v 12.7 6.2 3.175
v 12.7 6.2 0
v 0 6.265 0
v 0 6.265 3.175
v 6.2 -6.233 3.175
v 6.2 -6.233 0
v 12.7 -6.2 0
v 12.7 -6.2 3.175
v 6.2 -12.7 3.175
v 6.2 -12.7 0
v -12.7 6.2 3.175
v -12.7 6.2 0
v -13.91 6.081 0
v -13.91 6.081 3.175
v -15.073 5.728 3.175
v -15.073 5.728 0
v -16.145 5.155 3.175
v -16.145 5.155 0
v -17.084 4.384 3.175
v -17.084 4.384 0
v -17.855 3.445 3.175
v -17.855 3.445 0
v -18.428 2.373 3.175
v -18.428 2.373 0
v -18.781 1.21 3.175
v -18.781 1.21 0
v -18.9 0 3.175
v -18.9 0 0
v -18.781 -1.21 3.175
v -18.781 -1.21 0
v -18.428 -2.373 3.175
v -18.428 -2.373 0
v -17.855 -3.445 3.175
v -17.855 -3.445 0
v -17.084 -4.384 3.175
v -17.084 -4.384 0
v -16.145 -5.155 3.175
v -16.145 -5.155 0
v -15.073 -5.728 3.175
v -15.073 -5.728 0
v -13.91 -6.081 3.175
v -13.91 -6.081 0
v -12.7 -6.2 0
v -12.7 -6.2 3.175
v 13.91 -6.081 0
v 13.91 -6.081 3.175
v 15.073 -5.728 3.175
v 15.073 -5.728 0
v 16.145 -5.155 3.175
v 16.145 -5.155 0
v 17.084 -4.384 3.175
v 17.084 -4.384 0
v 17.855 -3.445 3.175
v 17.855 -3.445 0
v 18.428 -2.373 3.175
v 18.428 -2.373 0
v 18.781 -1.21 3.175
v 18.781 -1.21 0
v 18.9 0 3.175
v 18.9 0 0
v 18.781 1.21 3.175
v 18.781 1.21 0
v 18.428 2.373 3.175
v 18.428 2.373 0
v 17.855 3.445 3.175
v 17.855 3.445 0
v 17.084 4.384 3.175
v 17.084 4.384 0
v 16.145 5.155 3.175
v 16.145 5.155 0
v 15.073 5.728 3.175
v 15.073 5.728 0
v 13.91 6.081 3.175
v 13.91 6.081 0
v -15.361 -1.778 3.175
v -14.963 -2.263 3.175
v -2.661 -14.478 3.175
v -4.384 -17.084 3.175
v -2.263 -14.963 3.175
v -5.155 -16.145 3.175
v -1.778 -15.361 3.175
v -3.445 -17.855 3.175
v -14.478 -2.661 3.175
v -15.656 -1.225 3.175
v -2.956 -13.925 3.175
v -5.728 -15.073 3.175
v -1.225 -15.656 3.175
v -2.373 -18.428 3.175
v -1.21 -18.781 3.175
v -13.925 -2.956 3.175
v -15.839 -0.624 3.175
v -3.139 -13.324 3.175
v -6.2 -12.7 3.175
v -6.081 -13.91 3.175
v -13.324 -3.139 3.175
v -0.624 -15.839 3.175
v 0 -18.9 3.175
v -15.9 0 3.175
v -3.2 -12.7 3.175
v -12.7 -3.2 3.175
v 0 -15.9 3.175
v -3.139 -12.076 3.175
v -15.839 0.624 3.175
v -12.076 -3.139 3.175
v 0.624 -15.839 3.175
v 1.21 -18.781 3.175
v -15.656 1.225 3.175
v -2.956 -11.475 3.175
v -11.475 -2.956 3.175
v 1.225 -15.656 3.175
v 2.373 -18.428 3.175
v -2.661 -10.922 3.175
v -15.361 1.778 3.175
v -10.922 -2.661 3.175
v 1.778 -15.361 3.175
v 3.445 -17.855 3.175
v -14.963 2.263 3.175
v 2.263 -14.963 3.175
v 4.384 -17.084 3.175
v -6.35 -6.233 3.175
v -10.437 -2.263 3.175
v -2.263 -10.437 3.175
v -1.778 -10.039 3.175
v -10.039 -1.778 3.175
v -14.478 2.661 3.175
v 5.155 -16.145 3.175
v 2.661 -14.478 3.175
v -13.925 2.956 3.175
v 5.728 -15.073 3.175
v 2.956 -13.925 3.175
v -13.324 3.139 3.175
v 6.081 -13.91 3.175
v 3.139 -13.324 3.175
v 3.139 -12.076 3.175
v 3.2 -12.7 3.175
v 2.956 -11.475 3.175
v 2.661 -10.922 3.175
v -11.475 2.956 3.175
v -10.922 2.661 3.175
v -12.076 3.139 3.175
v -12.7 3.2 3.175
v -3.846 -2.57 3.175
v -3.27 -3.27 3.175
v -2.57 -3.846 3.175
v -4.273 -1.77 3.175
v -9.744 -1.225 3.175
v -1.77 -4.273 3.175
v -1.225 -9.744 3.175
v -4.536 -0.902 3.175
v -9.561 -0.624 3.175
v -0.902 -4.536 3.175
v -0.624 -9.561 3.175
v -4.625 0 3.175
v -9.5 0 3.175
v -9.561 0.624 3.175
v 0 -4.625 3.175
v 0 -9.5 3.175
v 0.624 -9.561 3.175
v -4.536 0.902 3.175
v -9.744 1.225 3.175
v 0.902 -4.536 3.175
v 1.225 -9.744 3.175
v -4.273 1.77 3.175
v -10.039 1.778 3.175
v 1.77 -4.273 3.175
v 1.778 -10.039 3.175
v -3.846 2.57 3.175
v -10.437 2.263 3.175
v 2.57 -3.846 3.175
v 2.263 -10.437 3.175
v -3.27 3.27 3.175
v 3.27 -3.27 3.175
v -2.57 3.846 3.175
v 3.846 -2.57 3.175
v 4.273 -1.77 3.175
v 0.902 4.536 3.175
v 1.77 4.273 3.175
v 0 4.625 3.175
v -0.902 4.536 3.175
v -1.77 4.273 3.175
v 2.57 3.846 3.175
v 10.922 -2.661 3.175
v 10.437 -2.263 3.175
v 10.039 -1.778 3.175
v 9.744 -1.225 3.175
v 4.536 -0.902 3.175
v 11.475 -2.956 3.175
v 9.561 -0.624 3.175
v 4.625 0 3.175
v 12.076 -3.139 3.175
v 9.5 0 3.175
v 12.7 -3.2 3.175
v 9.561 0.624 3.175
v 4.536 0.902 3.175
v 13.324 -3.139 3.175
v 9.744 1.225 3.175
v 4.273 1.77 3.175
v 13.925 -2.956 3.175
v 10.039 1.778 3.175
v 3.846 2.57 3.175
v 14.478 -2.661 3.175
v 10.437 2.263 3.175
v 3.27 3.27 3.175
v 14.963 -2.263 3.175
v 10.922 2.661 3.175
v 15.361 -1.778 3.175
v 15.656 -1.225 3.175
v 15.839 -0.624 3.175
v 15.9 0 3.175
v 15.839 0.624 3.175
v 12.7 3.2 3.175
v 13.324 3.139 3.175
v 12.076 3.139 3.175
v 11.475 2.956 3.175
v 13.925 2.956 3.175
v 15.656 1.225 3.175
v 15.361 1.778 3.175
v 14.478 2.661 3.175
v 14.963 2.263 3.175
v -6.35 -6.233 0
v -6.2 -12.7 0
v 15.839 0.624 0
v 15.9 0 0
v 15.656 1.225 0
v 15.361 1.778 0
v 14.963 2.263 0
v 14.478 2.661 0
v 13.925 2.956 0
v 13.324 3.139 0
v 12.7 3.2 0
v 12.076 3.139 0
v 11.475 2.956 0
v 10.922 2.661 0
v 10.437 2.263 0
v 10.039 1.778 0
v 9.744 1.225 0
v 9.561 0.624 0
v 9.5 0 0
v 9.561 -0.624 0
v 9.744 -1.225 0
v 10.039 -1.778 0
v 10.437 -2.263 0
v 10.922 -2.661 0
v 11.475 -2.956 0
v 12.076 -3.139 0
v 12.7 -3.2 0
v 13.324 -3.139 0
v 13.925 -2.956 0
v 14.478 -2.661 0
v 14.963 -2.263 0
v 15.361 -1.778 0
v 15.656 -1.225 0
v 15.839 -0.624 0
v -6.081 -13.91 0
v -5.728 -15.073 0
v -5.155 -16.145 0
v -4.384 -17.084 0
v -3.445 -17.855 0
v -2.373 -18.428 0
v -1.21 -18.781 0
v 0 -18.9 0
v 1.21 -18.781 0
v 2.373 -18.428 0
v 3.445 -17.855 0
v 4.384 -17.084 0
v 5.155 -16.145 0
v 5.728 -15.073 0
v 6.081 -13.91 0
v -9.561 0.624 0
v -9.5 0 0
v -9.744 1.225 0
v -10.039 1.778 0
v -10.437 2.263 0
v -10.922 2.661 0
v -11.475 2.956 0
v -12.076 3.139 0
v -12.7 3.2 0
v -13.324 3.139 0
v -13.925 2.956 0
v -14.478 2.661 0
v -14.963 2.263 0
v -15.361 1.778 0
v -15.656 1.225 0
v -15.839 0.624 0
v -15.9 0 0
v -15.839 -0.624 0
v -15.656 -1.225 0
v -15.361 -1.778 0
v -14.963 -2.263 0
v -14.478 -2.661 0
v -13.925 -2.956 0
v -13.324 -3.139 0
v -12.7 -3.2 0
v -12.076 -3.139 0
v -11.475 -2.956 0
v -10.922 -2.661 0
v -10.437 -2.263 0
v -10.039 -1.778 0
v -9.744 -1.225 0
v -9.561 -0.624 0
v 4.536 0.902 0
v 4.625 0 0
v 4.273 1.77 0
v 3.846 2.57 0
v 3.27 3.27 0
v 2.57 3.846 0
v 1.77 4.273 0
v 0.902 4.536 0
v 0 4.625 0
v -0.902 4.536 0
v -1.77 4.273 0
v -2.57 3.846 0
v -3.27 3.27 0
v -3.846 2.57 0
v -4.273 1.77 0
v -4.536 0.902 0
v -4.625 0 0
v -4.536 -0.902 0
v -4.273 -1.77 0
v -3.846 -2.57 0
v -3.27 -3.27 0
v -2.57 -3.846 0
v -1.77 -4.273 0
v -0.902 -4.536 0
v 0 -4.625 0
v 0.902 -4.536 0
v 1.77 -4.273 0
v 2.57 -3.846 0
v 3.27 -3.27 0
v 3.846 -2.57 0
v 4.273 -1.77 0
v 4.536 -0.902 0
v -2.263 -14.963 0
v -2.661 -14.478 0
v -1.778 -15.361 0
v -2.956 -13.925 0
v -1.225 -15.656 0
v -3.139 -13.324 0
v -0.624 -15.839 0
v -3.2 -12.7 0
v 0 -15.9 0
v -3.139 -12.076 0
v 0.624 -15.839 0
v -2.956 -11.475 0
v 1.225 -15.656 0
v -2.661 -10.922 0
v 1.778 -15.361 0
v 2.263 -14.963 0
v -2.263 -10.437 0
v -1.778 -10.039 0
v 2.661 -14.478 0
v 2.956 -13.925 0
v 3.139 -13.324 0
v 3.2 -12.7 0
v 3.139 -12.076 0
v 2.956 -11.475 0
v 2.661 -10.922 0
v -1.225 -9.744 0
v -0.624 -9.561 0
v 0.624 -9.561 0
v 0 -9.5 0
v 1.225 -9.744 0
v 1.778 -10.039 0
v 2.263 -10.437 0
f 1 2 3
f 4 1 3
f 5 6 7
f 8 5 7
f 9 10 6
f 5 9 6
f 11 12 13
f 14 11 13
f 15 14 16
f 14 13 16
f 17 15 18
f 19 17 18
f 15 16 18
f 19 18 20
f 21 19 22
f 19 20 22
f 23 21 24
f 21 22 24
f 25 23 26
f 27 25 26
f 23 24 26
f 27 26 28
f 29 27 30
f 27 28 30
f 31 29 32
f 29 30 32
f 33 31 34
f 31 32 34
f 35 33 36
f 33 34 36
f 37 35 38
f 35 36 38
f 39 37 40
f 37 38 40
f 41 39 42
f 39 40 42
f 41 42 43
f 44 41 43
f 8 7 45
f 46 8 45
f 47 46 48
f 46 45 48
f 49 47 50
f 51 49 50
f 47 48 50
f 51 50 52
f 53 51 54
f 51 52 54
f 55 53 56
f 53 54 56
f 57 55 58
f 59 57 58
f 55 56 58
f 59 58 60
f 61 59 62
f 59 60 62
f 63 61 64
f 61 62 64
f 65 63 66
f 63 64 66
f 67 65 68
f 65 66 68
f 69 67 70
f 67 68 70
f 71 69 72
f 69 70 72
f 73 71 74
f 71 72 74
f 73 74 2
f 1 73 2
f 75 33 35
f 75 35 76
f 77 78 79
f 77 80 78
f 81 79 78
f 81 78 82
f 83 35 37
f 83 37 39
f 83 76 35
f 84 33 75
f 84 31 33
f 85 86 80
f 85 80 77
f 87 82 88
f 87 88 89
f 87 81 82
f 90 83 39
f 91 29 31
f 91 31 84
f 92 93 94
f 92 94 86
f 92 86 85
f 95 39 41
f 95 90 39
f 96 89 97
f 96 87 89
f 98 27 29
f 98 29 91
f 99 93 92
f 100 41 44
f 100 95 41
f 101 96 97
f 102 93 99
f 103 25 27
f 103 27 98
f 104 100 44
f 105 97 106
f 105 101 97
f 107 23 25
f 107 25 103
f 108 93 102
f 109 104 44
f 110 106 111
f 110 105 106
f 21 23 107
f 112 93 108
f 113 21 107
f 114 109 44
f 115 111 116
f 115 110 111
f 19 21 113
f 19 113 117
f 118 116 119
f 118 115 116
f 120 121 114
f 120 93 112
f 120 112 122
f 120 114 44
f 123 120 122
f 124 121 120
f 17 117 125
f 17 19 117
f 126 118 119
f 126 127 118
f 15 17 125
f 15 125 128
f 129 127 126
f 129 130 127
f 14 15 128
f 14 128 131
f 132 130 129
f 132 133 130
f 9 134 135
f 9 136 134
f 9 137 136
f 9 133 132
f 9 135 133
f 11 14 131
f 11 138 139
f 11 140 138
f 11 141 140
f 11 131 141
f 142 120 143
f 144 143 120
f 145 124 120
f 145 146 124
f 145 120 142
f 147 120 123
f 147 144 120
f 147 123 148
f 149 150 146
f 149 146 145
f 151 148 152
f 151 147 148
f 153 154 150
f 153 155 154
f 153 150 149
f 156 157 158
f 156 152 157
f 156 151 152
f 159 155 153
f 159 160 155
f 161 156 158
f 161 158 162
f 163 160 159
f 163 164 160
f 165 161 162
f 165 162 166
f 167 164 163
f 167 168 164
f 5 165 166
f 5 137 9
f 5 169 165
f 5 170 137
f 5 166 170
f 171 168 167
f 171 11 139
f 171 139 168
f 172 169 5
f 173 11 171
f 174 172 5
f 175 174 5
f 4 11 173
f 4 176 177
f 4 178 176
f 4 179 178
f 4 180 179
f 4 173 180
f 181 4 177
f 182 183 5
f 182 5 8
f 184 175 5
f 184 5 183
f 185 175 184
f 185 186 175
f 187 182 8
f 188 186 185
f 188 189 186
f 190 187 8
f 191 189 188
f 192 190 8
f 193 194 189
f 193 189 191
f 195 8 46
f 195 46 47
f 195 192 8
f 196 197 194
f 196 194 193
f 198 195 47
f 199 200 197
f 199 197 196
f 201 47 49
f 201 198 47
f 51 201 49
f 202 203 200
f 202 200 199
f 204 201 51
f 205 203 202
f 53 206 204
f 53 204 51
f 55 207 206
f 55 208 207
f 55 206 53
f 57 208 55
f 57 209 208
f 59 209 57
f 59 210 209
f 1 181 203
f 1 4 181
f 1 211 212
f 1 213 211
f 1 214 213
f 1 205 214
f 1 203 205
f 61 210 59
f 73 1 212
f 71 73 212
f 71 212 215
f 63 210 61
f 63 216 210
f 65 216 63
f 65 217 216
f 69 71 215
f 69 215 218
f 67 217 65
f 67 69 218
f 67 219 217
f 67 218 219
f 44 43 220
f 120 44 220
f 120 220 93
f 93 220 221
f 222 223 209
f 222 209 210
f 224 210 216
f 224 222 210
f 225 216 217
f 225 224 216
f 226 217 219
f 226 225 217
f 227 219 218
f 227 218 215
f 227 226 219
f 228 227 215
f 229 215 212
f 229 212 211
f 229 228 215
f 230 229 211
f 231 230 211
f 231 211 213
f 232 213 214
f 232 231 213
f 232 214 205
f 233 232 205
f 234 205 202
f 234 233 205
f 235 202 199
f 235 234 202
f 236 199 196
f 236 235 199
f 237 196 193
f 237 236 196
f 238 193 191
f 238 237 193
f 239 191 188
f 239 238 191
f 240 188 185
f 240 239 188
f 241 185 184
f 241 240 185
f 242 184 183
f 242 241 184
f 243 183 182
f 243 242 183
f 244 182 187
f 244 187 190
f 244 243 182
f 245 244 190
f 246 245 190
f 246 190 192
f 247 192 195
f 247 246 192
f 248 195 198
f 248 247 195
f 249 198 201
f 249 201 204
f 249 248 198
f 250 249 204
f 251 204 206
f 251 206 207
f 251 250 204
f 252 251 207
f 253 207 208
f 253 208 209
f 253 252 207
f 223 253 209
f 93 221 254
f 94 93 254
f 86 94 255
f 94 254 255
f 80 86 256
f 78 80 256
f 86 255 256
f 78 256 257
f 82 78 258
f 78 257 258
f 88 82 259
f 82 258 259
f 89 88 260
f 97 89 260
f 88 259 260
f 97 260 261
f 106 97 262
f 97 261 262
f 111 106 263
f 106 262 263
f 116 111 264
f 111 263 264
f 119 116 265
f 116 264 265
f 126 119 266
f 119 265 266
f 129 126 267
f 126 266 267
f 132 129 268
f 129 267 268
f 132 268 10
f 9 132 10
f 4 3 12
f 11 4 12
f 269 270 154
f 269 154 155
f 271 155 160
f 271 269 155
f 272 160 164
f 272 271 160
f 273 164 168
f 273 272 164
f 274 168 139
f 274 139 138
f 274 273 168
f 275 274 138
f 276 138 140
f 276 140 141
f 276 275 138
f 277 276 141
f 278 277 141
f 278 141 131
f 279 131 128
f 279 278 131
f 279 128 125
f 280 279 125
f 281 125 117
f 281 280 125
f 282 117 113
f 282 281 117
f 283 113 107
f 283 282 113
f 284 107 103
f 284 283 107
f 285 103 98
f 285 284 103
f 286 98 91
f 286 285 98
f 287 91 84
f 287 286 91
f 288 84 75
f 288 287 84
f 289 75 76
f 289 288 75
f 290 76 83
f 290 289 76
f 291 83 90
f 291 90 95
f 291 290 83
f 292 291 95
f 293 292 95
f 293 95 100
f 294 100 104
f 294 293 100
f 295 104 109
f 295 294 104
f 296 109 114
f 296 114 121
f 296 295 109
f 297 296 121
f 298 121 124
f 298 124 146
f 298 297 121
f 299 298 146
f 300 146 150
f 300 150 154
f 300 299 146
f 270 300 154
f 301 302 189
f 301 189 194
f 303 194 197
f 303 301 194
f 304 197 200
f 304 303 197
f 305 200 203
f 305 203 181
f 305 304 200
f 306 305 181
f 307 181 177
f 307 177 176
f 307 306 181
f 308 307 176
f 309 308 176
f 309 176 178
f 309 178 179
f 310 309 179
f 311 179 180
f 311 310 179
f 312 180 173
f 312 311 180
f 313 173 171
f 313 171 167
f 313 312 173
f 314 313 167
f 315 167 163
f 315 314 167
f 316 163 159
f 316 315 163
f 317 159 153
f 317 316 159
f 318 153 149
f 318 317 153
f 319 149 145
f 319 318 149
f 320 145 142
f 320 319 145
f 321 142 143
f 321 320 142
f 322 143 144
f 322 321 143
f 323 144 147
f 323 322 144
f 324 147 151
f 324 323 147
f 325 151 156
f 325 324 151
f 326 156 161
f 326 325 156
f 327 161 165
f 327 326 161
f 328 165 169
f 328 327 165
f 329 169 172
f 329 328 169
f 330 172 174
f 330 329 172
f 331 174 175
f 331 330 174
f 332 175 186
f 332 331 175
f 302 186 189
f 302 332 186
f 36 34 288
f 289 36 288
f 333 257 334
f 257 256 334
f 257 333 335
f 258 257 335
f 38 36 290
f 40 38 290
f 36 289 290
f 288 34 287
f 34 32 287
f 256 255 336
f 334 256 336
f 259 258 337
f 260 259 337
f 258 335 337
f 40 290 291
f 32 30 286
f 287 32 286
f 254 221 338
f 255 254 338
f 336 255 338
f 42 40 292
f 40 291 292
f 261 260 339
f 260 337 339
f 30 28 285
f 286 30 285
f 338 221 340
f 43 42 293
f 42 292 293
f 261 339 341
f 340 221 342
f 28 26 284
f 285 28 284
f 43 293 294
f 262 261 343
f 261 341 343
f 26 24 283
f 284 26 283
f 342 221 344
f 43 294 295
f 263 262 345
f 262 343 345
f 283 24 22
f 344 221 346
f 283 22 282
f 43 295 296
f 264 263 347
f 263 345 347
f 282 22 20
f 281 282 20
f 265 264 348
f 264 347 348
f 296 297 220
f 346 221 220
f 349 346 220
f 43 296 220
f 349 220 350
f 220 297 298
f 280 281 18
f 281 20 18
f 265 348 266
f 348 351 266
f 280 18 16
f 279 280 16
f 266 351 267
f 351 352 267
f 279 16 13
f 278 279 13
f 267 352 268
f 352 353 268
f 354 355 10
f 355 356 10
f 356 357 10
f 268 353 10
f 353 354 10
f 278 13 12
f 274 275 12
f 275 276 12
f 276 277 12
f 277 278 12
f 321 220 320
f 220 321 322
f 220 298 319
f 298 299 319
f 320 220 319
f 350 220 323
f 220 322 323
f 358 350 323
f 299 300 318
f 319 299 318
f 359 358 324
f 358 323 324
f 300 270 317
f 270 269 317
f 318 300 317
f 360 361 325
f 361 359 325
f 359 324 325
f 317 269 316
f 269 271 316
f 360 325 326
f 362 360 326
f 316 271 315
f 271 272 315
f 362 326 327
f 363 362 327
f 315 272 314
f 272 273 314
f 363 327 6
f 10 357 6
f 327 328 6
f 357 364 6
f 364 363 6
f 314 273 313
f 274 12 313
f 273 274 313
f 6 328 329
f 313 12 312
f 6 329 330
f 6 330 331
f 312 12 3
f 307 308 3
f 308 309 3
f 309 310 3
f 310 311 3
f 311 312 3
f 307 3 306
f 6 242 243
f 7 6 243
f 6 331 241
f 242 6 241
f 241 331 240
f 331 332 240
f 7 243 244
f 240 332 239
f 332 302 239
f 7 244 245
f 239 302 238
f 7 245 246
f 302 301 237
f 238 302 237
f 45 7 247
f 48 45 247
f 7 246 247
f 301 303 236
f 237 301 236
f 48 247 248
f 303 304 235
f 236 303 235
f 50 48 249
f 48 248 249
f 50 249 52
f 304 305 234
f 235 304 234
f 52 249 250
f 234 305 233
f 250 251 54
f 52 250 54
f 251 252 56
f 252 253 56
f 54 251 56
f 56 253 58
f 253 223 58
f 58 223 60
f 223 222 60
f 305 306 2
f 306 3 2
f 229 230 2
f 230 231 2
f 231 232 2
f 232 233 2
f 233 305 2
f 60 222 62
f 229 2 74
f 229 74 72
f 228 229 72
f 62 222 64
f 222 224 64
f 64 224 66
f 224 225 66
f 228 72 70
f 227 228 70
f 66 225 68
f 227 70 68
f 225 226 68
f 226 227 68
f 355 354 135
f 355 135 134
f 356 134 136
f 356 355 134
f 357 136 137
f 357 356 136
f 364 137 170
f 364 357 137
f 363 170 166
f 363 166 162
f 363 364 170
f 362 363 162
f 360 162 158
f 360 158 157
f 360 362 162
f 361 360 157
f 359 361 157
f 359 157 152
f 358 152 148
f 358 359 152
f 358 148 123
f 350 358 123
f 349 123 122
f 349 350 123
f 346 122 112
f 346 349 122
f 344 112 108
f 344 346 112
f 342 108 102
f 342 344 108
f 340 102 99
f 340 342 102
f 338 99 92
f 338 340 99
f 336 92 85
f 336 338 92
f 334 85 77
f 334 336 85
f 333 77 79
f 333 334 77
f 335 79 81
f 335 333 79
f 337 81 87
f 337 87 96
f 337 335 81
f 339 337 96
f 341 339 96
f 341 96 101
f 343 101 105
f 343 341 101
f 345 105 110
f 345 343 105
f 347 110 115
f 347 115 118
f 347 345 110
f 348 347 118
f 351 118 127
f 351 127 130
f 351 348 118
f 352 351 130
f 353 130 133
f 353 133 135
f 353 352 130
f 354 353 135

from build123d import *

# Parameters (mm, degrees)
SKETCH3_R           = 3.2
SKETCH3_R_2         = 4.625
BOSS_EXTRUDE1_DEPTH = 3.175


with BuildPart() as part:
    # Sketch3 → Boss-Extrude1 (new body)
    with BuildSketch(Plane.XY):
        with BuildLine():
            Line((0, 6.265082263), (-12.7, 6.2))
            ThreePointArc((-12.7, 6.2), (-18.9, 0), (-12.7, -6.2))
            Line((-12.7, -6.2), (-6.35, -6.232541132))
            Line((-6.35, -6.232541132), (-6.2, -12.7))
            ThreePointArc((-6.2, -12.7), (0, -18.9), (6.2, -12.7))
            Line((6.2, -12.7), (6.2, -6.23330982))
            Line((6.2, -6.23330982), (12.7, -6.2))
            ThreePointArc((12.7, -6.2), (18.9, 0), (12.7, 6.2))
            Line((12.7, 6.2), (0, 6.265082263))
        make_face()
        with Locations((-12.7, 0)):
            Circle(SKETCH3_R, mode=Mode.SUBTRACT)
        with Locations((12.7, 0)):
            Circle(SKETCH3_R, mode=Mode.SUBTRACT)
        Circle(SKETCH3_R_2, mode=Mode.SUBTRACT)
        with Locations((0, -12.7)):
            Circle(SKETCH3_R, mode=Mode.SUBTRACT)
    extrude(amount=BOSS_EXTRUDE1_DEPTH)


solid = part.part
